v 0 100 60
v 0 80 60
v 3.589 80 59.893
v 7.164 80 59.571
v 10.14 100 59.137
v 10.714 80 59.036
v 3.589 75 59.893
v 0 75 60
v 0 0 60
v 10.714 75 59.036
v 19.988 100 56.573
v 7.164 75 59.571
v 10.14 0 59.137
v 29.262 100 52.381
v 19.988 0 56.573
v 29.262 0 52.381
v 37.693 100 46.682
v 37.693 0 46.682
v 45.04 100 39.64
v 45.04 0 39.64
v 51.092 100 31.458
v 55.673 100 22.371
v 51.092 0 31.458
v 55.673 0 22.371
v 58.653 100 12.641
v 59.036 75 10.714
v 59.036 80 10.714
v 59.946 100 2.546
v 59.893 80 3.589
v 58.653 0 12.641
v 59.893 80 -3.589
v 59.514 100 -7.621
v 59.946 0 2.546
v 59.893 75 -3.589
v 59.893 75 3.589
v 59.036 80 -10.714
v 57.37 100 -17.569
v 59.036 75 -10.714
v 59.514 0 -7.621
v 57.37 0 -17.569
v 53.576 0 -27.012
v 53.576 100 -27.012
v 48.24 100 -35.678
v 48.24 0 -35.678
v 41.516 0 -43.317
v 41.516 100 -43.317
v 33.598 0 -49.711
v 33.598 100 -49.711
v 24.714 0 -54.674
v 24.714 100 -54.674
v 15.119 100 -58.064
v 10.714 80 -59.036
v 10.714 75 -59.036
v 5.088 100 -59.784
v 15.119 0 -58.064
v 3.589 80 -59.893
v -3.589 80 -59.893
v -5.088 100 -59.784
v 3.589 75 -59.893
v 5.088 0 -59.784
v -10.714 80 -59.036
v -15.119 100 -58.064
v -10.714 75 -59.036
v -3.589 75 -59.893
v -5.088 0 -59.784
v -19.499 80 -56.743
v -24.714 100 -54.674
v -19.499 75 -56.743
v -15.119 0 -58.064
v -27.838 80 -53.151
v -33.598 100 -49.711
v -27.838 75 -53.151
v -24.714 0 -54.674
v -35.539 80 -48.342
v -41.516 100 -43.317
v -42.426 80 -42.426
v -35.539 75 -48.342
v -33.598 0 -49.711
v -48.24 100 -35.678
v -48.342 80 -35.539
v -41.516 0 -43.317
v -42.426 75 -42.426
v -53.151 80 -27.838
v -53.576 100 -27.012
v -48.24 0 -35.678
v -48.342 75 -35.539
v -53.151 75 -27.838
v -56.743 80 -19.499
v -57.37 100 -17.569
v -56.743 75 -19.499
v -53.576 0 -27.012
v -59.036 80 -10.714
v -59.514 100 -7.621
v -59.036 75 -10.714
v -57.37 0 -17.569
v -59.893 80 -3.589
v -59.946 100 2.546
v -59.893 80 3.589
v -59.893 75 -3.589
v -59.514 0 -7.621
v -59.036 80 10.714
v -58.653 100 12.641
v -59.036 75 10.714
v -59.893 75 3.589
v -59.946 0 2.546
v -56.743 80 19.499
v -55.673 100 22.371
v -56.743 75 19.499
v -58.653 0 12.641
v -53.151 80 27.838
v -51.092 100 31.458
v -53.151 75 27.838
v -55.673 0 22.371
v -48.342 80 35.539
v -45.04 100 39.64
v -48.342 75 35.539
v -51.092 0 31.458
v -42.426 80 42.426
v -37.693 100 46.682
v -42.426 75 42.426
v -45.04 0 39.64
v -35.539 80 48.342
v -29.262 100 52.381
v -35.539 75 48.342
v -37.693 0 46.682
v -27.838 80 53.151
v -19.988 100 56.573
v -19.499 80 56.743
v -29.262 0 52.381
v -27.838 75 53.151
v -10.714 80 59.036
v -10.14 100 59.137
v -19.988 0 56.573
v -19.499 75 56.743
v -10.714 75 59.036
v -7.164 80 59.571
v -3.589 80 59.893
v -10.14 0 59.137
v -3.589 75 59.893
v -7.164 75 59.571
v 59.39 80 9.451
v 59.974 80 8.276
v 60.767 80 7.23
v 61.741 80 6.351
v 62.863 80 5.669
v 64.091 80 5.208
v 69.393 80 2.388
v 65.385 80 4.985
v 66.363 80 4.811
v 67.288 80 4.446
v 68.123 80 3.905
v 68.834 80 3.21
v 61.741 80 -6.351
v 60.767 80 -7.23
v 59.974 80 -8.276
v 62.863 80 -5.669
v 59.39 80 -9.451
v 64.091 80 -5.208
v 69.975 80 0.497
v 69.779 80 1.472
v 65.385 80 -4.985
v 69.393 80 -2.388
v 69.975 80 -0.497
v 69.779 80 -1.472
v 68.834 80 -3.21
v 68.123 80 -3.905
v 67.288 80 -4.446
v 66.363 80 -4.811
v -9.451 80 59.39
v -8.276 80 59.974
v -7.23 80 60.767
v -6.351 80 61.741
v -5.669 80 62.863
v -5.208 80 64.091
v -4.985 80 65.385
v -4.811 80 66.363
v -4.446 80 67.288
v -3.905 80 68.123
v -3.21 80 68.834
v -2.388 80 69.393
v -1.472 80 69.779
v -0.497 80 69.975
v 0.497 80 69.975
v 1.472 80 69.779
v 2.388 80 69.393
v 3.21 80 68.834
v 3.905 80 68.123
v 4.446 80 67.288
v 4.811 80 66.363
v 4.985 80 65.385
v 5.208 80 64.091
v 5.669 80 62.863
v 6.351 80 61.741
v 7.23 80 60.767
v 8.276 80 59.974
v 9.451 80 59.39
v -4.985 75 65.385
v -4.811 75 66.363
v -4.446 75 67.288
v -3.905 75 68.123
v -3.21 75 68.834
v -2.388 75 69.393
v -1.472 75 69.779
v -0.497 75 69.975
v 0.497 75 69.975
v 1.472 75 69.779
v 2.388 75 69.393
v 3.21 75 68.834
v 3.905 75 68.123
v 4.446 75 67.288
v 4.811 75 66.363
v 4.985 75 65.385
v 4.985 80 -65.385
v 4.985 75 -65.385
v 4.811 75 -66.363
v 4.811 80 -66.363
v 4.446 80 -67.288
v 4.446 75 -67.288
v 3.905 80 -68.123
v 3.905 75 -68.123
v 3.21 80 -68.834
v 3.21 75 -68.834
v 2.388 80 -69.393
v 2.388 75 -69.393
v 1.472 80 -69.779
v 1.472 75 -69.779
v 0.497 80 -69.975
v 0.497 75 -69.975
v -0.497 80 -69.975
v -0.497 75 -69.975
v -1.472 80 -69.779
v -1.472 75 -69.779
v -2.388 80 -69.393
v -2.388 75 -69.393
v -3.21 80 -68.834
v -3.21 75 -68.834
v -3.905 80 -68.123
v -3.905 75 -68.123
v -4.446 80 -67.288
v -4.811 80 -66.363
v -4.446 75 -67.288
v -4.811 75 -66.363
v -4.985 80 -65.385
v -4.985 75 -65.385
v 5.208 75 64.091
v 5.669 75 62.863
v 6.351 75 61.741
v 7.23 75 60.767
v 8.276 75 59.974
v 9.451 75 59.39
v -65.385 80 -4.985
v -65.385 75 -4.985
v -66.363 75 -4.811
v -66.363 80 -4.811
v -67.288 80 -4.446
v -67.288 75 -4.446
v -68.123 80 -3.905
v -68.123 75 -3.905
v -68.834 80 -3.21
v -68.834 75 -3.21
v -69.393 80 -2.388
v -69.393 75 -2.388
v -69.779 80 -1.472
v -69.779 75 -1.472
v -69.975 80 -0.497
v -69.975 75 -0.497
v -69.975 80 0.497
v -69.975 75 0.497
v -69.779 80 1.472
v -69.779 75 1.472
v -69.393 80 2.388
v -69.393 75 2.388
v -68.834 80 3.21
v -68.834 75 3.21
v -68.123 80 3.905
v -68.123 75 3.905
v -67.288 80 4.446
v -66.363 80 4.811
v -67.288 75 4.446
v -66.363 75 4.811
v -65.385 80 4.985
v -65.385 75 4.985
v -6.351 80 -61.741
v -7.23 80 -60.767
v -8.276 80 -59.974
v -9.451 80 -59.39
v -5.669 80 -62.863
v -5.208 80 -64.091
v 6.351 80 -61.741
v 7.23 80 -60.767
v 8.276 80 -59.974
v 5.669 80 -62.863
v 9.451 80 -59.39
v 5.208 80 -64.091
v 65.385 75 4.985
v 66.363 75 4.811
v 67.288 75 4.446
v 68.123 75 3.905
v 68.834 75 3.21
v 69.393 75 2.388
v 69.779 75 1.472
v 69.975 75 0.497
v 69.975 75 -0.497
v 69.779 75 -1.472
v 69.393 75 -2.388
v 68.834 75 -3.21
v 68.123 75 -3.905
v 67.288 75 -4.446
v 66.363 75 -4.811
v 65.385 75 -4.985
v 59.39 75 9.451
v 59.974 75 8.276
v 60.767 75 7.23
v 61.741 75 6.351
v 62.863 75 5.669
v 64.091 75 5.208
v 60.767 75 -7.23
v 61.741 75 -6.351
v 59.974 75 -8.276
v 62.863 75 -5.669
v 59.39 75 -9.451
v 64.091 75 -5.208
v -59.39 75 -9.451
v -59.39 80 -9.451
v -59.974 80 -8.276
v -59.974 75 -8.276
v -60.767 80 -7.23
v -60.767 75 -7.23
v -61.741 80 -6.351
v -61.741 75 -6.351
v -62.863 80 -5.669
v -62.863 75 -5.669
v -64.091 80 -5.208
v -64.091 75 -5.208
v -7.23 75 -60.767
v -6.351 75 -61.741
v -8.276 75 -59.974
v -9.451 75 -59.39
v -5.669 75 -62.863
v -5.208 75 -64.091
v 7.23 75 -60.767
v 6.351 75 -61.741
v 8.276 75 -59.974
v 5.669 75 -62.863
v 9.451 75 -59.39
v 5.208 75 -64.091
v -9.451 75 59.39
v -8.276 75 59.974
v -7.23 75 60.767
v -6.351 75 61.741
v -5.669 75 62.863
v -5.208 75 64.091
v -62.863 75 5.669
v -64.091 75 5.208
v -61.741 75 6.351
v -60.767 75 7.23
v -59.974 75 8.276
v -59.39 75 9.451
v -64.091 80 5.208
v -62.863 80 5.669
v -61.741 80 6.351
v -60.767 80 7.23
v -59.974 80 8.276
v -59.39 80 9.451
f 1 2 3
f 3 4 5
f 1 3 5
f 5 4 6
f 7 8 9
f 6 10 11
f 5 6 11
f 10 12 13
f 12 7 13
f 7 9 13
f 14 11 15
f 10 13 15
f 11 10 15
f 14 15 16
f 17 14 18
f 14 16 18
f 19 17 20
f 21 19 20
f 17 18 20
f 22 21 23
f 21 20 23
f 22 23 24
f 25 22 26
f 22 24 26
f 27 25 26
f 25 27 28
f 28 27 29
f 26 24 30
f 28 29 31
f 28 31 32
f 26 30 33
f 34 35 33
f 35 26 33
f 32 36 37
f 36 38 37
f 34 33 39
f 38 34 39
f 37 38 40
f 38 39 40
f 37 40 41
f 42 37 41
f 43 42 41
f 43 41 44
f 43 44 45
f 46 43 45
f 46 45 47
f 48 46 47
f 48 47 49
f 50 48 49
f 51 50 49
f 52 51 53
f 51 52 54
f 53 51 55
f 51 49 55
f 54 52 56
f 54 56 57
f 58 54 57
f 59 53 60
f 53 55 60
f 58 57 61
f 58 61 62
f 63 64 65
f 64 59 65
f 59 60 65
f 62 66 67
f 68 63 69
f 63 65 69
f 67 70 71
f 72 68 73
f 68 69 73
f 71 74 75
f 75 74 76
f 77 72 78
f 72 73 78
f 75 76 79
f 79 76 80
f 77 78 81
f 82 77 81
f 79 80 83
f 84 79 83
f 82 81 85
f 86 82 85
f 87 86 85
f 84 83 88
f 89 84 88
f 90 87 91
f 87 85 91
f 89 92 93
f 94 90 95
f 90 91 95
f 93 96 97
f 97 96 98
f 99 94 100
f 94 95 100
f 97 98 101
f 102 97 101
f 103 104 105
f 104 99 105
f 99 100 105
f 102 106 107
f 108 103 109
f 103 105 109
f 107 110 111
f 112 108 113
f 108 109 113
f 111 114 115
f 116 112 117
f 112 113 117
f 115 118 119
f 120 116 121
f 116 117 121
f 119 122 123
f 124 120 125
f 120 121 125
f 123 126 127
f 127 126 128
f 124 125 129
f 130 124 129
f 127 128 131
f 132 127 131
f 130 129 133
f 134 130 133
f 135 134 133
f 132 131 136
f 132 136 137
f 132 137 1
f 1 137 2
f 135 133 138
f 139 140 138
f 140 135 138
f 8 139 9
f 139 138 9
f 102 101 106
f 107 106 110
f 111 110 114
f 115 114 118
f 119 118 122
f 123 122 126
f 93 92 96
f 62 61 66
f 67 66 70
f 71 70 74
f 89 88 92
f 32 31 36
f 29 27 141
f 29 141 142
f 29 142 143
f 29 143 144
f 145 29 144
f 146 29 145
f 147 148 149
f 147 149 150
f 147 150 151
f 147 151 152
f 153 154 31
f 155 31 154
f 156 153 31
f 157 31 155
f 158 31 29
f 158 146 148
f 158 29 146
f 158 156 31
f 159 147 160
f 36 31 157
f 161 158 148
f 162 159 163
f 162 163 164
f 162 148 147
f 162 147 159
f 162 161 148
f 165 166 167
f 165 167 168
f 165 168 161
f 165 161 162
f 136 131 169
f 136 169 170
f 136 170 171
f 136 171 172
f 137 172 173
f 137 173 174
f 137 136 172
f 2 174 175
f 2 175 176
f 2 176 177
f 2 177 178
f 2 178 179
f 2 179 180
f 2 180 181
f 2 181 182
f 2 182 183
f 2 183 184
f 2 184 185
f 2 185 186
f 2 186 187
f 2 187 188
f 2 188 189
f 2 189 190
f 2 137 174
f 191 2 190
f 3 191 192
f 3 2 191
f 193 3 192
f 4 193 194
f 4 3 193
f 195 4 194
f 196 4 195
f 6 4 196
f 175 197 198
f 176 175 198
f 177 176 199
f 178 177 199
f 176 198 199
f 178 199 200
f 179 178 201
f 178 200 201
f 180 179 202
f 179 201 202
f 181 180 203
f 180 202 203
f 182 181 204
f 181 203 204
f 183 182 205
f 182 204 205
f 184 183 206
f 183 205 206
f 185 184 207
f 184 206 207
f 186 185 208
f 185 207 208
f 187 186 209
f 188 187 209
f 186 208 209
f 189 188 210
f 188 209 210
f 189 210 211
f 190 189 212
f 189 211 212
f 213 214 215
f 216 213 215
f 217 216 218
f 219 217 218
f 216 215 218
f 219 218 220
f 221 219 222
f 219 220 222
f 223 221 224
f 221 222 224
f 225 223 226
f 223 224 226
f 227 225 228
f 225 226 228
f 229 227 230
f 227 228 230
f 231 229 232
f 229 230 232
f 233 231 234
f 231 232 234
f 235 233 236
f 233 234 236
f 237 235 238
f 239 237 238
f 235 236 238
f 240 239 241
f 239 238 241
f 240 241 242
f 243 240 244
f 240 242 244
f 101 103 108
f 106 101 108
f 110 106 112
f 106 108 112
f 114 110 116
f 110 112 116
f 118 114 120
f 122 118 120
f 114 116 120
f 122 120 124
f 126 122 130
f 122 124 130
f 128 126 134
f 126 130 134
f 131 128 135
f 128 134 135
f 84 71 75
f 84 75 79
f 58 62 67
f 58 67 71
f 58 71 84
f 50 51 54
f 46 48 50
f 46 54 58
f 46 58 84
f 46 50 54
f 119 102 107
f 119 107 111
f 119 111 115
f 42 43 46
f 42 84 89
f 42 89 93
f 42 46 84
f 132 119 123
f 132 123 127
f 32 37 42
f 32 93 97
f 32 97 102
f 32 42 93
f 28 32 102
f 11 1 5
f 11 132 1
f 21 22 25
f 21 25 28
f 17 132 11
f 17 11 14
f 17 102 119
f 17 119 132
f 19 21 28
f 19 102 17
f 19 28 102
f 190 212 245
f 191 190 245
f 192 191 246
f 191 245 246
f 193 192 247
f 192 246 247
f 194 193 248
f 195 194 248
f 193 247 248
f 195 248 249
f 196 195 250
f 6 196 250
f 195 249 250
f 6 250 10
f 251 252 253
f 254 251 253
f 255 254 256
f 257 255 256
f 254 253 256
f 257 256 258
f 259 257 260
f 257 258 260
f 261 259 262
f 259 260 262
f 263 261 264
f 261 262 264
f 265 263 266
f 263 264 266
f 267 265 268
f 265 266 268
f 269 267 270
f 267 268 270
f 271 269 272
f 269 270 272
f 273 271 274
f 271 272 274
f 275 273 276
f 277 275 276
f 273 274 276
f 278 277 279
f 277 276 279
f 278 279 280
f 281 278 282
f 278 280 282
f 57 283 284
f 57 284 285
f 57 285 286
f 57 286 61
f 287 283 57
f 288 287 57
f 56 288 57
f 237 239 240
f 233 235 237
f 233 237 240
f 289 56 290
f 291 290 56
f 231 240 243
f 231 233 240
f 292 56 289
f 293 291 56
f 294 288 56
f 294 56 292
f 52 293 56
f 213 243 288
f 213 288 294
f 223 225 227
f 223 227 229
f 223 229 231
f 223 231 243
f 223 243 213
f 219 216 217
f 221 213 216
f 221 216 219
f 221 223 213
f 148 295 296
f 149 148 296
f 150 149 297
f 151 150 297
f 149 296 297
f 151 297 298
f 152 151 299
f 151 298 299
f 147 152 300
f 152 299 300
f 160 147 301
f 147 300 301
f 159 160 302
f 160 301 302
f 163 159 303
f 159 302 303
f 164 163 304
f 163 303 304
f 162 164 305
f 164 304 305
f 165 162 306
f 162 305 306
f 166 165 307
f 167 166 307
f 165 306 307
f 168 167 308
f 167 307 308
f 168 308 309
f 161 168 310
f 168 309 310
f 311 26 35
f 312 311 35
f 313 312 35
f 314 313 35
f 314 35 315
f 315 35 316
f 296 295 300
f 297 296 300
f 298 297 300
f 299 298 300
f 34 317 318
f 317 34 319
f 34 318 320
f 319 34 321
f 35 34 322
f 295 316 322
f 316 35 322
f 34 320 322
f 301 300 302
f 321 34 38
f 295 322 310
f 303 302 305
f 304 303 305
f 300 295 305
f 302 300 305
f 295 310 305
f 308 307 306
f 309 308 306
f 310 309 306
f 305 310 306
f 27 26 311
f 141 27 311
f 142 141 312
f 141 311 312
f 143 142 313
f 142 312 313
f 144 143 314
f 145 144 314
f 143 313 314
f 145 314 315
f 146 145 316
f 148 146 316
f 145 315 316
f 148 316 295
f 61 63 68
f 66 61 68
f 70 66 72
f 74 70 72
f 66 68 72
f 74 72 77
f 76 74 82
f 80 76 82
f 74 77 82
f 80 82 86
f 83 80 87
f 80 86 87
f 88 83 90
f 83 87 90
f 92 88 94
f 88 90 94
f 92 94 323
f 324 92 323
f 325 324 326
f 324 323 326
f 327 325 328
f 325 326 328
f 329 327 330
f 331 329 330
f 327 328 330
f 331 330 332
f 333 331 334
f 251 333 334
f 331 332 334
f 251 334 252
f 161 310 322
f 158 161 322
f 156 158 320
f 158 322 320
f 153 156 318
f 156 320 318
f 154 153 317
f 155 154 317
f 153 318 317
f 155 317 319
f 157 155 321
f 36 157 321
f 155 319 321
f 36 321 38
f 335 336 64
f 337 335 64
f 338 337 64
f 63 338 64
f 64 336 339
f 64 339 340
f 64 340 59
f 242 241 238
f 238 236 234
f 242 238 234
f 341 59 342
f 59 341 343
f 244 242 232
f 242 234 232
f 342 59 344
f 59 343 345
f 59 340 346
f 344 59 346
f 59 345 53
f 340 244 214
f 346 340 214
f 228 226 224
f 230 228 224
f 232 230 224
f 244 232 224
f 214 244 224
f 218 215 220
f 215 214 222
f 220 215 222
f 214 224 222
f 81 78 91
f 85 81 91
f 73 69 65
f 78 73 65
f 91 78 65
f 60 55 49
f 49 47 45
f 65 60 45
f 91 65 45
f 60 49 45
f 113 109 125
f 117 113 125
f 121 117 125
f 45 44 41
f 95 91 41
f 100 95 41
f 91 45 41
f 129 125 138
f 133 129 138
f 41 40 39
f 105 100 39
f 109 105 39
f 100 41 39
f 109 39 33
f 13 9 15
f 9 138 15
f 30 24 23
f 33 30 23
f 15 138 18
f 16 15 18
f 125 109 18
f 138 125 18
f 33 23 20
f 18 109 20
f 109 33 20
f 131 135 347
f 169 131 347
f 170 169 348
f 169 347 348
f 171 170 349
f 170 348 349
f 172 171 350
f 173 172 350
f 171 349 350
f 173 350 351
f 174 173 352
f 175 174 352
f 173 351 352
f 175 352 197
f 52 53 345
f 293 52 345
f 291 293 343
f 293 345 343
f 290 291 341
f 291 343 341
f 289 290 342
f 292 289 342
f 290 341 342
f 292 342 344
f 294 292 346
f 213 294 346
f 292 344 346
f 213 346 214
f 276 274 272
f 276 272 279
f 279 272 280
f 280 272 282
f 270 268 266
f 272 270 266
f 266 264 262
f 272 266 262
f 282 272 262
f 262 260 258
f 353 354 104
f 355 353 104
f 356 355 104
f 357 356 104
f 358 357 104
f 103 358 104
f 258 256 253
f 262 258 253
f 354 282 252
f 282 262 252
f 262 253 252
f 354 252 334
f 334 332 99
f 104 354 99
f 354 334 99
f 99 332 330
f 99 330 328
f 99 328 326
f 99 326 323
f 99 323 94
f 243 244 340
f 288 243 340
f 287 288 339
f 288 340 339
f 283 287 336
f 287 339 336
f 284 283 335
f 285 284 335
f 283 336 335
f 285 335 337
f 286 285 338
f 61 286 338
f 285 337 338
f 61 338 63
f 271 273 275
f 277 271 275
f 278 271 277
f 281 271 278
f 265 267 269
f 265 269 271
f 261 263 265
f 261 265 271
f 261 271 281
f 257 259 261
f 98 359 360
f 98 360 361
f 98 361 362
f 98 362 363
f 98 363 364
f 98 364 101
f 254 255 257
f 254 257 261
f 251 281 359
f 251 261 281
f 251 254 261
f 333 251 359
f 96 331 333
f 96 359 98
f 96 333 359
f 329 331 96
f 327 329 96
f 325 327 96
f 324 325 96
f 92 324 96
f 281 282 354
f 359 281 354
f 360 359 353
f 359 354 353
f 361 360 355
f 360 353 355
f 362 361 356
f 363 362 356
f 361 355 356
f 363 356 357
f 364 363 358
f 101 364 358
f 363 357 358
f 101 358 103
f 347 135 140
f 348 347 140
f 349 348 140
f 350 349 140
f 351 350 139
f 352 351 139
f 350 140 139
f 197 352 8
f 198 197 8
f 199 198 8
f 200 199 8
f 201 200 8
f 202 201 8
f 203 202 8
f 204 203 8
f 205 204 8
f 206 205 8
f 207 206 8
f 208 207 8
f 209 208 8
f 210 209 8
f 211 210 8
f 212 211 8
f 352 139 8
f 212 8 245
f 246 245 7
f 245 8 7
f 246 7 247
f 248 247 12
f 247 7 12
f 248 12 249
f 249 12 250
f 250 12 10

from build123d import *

# Parameters (mm, degrees)
SKETCH1_R           = 60
BOSS_EXTRUDE1_DEPTH = 100
BOSS_EXTRUDE2_START = -25
BOSS_EXTRUDE2_DEPTH = 5


with BuildPart() as part:
    # Sketch1 → Boss-Extrude1 (new body)
    with BuildSketch(Plane(origin=(0, 0, 0), x_dir=(1, 0, 0), z_dir=(0, 1, 0))):
        with Locations(Location((0, 0, 0), (0, 0, 270))):
            Circle(SKETCH1_R)
    extrude(amount=BOSS_EXTRUDE1_DEPTH)

    # Sketch2 → Boss-Extrude2 (add)
    with BuildSketch(Plane(origin=(0, 100, 0), x_dir=(1, 0, 0), z_dir=(0, 1, 0)).offset(BOSS_EXTRUDE2_START)):
        with BuildLine():
            ThreePointArc((-10.714427791, 59.035591274), (-42.426406871, 42.426406871), (-59.035591274, 10.714427791))
            ThreePointArc((-59.035591274, 10.714427791), (-61.233489712, 6.767544156), (-65.384615385, 4.985185153))
            ThreePointArc((-65.384615385, 4.985185153), (-70, 0), (-65.384615385, -4.985185153))
            ThreePointArc((-65.384615385, -4.985185153), (-61.233489712, -6.767544156), (-59.035591274, -10.714427791))
            ThreePointArc((-59.035591274, -10.714427791), (-42.426406871, -42.426406871), (-10.714427791, -59.035591274))
            ThreePointArc((-10.714427791, -59.035591274), (-6.767544156, -61.233489712), (-4.985185153, -65.384615385))
            ThreePointArc((-4.985185153, -65.384615385), (0, -70), (4.985185153, -65.384615385))
            ThreePointArc((4.985185153, -65.384615385), (6.767544156, -61.233489712), (10.714427791, -59.035591274))
            ThreePointArc((10.714427791, -59.035591274), (42.426406871, -42.426406871), (59.035591274, -10.714427791))
            ThreePointArc((59.035591274, -10.714427791), (61.233489712, -6.767544156), (65.384615385, -4.985185153))
            ThreePointArc((65.384615385, -4.985185153), (70, 0), (65.384615385, 4.985185153))
            ThreePointArc((65.384615385, 4.985185153), (61.233489712, 6.767544156), (59.035591274, 10.714427791))
            ThreePointArc((59.035591274, 10.714427791), (42.426406871, 42.426406871), (10.714427791, 59.035591274))
            ThreePointArc((10.714427791, 59.035591274), (6.767544156, 61.233489712), (4.985185153, 65.384615385))
            ThreePointArc((4.985185153, 65.384615385), (0, 70), (-4.985185153, 65.384615385))
            ThreePointArc((-4.985185153, 65.384615385), (-6.767544156, 61.233489712), (-10.714427791, 59.035591274))
        make_face()
    extrude(amount=BOSS_EXTRUDE2_DEPTH)


solid = part.part
